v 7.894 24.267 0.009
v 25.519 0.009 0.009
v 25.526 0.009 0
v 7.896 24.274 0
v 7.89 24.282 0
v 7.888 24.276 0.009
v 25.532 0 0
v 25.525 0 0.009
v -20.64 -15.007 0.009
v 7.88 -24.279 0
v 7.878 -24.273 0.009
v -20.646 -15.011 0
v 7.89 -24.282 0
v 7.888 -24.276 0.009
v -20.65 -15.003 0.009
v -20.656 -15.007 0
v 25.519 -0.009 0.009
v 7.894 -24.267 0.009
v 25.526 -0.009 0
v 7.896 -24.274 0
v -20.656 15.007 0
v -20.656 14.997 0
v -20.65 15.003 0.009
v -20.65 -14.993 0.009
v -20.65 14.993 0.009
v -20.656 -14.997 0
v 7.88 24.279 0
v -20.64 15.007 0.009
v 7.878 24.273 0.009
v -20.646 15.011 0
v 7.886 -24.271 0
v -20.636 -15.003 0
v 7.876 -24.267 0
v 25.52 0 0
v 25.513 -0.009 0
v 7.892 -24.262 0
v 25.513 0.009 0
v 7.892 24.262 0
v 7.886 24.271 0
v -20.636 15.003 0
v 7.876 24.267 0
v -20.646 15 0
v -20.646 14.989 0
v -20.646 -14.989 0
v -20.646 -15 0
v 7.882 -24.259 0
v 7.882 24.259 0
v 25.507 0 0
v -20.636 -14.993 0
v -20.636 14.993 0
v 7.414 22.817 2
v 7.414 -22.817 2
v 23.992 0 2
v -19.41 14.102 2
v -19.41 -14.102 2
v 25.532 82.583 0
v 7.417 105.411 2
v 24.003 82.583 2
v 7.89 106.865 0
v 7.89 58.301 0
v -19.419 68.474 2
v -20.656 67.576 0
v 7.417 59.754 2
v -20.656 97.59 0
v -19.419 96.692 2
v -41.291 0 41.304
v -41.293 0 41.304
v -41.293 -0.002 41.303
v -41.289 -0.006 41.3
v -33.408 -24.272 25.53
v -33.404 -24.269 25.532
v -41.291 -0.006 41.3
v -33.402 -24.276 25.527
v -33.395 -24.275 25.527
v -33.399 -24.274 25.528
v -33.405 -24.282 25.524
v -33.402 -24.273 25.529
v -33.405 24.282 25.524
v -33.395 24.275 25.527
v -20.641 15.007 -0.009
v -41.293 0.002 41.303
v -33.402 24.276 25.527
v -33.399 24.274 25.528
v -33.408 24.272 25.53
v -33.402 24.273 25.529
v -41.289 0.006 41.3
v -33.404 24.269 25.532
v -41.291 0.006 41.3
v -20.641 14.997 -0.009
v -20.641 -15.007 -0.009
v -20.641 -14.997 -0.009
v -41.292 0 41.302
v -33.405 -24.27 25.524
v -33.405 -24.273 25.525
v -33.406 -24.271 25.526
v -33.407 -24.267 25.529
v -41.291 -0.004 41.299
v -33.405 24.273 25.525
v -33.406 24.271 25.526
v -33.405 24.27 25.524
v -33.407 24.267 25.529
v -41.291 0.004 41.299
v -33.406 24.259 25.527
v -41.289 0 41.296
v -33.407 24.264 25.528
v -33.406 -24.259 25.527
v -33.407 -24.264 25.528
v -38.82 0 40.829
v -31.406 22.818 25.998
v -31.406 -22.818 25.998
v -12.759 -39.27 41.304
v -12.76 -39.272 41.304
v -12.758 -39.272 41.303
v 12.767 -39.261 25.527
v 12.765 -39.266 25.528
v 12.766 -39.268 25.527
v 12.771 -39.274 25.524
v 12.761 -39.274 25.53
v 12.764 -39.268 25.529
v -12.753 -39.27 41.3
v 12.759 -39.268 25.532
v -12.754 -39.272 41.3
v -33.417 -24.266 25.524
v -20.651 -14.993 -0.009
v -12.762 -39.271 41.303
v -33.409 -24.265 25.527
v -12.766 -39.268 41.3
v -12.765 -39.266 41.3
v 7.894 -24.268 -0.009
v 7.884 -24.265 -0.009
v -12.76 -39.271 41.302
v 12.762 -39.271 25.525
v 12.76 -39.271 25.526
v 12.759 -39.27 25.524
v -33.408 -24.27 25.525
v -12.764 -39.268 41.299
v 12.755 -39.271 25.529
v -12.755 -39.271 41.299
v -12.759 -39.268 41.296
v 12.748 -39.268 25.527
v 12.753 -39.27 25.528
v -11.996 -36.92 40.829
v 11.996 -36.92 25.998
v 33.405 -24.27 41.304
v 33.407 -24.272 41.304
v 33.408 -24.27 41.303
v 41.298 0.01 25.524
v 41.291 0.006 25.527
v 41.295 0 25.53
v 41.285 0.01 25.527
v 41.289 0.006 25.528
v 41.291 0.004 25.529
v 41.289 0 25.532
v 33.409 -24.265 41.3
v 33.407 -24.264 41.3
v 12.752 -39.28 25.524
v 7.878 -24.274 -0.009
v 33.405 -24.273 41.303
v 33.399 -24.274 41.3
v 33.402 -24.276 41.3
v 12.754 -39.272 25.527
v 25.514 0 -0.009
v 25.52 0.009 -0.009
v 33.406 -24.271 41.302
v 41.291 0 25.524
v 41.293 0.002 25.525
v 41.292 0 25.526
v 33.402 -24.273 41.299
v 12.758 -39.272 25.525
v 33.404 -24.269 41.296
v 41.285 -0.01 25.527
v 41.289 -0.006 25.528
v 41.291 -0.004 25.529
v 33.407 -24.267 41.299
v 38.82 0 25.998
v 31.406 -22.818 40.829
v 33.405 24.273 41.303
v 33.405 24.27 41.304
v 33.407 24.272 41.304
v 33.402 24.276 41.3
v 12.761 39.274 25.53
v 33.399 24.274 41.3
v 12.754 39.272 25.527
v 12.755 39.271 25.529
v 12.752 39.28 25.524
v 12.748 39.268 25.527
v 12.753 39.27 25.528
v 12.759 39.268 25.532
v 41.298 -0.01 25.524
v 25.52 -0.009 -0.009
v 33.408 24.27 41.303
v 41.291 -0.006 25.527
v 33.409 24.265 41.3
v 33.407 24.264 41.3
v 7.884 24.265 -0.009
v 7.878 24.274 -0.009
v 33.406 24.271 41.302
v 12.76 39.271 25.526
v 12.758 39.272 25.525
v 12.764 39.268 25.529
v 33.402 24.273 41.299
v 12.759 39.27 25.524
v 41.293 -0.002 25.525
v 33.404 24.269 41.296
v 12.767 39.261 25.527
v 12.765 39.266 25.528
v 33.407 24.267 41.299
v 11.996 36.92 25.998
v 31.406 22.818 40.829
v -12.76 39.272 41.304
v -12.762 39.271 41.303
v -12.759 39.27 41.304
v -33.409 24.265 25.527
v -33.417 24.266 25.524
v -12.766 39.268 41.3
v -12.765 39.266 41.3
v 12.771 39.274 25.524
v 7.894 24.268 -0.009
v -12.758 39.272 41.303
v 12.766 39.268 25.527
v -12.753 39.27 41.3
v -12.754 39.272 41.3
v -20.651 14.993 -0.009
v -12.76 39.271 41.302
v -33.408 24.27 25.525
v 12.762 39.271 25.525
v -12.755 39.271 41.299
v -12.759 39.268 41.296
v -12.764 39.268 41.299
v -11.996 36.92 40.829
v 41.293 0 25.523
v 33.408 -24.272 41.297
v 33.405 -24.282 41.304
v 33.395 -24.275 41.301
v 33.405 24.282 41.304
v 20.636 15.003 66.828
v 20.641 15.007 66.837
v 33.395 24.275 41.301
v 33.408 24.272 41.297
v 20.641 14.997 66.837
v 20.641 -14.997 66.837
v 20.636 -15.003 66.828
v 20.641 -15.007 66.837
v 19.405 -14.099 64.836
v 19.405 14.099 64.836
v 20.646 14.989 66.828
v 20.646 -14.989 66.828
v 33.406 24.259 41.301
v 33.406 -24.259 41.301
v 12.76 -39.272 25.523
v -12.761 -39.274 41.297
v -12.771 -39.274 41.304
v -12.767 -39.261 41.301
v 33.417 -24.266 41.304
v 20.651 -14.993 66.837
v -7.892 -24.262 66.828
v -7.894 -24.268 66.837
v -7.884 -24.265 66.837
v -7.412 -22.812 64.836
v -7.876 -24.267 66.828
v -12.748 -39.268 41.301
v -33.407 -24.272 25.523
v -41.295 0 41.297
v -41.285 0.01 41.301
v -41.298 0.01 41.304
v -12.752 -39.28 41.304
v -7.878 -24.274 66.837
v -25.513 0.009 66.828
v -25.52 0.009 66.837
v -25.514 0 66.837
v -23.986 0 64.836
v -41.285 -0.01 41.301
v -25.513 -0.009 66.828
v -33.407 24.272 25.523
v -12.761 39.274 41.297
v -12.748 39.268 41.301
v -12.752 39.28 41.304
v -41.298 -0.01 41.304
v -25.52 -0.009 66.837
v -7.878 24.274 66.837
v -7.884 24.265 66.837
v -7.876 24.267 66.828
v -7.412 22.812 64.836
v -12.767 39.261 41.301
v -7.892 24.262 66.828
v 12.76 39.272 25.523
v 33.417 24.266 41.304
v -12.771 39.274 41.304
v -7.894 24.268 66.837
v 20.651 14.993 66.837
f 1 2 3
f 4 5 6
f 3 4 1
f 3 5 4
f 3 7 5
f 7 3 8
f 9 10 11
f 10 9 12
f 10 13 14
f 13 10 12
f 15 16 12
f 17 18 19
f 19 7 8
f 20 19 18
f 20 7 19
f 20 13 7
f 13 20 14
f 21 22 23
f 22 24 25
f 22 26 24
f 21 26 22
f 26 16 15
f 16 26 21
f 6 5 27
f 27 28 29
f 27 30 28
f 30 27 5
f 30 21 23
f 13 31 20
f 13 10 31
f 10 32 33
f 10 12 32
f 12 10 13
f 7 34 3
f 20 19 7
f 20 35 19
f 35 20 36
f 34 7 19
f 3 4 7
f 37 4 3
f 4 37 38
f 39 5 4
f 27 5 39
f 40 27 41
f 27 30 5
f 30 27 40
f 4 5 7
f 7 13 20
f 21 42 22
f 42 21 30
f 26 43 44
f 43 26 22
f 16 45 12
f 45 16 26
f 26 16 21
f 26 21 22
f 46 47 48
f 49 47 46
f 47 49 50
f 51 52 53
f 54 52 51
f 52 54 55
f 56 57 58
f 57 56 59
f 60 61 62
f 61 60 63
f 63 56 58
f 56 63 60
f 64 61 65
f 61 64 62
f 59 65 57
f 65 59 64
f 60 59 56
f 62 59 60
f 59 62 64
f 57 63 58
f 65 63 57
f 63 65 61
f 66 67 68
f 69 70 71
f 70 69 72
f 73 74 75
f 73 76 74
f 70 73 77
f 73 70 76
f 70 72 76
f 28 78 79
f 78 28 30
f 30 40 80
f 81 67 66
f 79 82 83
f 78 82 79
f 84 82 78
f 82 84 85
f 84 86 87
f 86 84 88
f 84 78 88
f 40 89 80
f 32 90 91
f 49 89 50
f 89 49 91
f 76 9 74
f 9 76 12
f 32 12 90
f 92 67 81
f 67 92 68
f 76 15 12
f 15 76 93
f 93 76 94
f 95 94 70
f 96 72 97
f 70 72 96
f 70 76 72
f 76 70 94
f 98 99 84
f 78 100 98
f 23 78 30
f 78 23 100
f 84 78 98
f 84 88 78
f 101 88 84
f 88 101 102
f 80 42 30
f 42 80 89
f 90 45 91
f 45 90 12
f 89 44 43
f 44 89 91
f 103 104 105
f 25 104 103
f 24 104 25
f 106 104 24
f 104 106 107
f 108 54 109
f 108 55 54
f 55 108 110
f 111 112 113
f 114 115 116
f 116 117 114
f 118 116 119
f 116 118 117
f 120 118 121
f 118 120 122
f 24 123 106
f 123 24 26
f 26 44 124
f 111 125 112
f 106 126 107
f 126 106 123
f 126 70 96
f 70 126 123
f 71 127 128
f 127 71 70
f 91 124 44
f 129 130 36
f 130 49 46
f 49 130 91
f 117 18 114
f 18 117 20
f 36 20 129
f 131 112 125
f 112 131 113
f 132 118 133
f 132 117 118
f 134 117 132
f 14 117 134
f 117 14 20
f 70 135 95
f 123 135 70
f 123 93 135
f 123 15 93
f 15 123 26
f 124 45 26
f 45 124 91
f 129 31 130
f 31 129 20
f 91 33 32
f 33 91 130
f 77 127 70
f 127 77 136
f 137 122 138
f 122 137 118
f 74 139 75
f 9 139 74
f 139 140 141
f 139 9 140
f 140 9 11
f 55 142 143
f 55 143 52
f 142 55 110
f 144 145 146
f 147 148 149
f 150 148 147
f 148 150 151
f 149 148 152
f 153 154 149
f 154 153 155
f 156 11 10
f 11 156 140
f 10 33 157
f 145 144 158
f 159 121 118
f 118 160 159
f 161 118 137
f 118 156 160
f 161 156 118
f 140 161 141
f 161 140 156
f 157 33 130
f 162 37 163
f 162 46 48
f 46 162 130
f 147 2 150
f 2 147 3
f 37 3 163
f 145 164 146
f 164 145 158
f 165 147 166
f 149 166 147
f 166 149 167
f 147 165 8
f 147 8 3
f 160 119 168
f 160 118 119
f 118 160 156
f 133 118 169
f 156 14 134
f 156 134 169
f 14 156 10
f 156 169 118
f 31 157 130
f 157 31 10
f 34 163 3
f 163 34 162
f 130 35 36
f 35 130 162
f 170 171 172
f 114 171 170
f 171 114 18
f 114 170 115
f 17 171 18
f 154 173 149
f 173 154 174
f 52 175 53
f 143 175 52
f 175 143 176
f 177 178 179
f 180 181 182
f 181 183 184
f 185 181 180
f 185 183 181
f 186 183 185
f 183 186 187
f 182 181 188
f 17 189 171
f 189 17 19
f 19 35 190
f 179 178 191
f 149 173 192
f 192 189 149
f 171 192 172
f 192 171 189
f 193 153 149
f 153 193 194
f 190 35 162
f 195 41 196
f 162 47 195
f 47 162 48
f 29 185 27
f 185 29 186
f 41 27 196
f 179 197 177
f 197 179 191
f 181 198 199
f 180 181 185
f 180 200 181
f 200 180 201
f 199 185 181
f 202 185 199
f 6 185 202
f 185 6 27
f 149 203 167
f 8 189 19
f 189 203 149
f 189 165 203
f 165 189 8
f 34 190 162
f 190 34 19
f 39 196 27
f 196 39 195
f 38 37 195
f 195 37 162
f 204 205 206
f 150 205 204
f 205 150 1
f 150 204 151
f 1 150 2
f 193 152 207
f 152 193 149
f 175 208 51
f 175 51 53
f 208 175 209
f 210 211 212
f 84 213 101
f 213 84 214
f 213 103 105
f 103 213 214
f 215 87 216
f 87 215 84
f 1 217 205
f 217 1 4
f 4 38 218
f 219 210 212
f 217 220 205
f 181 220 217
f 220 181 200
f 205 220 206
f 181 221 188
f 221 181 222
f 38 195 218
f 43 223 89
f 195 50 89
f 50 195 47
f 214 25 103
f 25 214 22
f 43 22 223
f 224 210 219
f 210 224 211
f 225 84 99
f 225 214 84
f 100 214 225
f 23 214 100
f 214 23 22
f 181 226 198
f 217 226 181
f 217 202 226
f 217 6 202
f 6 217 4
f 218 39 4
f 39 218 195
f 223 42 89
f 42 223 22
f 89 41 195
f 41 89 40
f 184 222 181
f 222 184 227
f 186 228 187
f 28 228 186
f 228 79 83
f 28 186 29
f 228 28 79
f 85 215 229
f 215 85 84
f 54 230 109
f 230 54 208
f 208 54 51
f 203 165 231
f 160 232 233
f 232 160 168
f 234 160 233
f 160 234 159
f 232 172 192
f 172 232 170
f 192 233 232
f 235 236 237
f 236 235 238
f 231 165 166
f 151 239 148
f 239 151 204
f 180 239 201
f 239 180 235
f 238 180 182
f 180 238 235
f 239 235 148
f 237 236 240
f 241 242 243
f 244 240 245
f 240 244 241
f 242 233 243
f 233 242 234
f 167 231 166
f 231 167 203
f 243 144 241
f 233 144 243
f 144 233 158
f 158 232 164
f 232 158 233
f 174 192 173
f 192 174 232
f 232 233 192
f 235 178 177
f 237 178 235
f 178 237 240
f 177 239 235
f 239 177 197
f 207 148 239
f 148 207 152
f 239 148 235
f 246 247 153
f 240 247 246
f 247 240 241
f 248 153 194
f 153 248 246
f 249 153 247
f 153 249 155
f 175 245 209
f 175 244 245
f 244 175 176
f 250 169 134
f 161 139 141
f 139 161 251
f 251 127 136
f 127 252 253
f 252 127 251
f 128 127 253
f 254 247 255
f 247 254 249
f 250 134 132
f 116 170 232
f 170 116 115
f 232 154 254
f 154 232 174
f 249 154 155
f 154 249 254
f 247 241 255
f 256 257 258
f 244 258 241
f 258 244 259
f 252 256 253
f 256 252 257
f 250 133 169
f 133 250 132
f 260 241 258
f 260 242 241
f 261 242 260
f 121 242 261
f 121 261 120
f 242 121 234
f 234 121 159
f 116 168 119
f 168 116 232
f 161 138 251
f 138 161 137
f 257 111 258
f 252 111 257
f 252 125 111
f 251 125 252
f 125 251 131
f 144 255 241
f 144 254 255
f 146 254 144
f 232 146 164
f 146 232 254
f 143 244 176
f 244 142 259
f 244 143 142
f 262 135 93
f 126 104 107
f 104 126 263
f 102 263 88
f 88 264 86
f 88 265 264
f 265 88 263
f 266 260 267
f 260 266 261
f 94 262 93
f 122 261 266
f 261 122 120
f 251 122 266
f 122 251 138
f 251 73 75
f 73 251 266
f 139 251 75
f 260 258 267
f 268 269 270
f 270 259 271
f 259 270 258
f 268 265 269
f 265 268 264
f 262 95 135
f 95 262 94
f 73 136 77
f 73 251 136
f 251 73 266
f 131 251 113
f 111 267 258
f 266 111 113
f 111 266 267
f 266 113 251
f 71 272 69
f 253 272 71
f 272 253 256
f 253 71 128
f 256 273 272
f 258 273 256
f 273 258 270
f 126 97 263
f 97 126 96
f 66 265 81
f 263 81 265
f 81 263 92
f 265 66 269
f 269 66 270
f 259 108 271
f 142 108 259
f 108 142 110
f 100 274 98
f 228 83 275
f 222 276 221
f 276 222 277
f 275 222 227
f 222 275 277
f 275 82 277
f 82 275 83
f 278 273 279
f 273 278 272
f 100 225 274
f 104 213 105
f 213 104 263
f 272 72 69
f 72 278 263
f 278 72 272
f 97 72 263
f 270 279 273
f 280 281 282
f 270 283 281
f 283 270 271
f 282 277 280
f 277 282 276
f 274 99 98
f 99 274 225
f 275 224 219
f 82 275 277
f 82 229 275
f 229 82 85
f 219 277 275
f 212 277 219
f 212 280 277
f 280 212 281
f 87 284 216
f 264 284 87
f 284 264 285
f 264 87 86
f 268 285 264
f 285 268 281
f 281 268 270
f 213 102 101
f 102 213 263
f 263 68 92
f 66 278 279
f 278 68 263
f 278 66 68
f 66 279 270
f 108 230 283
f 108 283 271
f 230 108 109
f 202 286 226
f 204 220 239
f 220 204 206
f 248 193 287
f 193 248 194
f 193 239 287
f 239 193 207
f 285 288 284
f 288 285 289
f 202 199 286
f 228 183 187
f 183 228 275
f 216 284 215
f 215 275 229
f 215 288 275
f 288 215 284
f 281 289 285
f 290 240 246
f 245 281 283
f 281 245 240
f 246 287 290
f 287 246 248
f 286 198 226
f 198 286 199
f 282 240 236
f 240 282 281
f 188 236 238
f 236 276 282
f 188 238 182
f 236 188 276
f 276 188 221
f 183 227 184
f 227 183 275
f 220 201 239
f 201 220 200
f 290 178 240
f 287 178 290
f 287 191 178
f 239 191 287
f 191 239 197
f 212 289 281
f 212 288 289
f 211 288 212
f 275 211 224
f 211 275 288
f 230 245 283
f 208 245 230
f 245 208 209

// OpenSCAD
// variables you control

$shape = "prototype"; // "plate" or "dado"
$side_length = 30;
$thickness = 2;
$leds = 0;


// things to change only if you're changing the code
$radius = $side_length / 1.175;
$sides = 5;
$inradius = $side_length / (2*tan(36));
$dihedral = 116.56;
$rgb_led_dimension = 8.5;
$led_delta = .5;


$cone_height = $side_length * 1.1135;

module rgb_led(body_diameter) {
  sphere(d=body_diameter);
  cylinder(5.5,body_diameter/2,body_diameter/2);
  translate([0,0,5]) {
    cylinder(2,9.5/2,(body_diameter+1)/2);
  }
}


module plate() {
  difference() {
      cylinder(h = $cone_height,
               r1 = $radius,
               r2 = 0,
               $fn = $sides);
        
      translate([0,0,$thickness]) {
        cylinder(h = $cone_height,
        r1 = $radius,
        r2 = 0,
        $fn = $sides);
      }    
      
  }
}
  

    

if ($shape == "prototype") {
    
    translate([0,$inradius*4],0) plate();
    
    
    plate();
   
    for(i = [0 : $sides - 1]) {
      rotate([0,0,(360/5)*i])
        translate([-$inradius,0,0])
          rotate([0, 180-($dihedral), 0])
            translate([-$inradius,0,0])
              rotate([0,0,180])
                plate();
    }
    
    translate([0,0,$inradius*3.14+ $thickness]) {
    rotate([0,180,0]) {
    for(i = [0 : $sides - 1]) {
      rotate([0,0,(360/5)*i])
        translate([-$inradius,0,0])
          rotate([0, 180-($dihedral), 0])
            translate([-$inradius,0,0])
              rotate([0,0,180])
                plate();
    }}}
    
    
    if ($leds == 1) {
    //punch out the center led
    translate([0,0,$rgb_led_dimension/2]) {
      rgb_led($rgb_led_dimension-$led_delta);
    }
    
    // punch out the 5 ledsaround the edge.
    rotate([0,0,-18]) {
      for(i = [0 : $sides - 1]) {
        rotate([0,0,(360/5)*i]) {
          translate([0,$radius*0.66,$rgb_led_dimension/2]) {
            rgb_led($rgb_led_dimension-$led_delta);
          }
        }
      }
    }
  }
}
